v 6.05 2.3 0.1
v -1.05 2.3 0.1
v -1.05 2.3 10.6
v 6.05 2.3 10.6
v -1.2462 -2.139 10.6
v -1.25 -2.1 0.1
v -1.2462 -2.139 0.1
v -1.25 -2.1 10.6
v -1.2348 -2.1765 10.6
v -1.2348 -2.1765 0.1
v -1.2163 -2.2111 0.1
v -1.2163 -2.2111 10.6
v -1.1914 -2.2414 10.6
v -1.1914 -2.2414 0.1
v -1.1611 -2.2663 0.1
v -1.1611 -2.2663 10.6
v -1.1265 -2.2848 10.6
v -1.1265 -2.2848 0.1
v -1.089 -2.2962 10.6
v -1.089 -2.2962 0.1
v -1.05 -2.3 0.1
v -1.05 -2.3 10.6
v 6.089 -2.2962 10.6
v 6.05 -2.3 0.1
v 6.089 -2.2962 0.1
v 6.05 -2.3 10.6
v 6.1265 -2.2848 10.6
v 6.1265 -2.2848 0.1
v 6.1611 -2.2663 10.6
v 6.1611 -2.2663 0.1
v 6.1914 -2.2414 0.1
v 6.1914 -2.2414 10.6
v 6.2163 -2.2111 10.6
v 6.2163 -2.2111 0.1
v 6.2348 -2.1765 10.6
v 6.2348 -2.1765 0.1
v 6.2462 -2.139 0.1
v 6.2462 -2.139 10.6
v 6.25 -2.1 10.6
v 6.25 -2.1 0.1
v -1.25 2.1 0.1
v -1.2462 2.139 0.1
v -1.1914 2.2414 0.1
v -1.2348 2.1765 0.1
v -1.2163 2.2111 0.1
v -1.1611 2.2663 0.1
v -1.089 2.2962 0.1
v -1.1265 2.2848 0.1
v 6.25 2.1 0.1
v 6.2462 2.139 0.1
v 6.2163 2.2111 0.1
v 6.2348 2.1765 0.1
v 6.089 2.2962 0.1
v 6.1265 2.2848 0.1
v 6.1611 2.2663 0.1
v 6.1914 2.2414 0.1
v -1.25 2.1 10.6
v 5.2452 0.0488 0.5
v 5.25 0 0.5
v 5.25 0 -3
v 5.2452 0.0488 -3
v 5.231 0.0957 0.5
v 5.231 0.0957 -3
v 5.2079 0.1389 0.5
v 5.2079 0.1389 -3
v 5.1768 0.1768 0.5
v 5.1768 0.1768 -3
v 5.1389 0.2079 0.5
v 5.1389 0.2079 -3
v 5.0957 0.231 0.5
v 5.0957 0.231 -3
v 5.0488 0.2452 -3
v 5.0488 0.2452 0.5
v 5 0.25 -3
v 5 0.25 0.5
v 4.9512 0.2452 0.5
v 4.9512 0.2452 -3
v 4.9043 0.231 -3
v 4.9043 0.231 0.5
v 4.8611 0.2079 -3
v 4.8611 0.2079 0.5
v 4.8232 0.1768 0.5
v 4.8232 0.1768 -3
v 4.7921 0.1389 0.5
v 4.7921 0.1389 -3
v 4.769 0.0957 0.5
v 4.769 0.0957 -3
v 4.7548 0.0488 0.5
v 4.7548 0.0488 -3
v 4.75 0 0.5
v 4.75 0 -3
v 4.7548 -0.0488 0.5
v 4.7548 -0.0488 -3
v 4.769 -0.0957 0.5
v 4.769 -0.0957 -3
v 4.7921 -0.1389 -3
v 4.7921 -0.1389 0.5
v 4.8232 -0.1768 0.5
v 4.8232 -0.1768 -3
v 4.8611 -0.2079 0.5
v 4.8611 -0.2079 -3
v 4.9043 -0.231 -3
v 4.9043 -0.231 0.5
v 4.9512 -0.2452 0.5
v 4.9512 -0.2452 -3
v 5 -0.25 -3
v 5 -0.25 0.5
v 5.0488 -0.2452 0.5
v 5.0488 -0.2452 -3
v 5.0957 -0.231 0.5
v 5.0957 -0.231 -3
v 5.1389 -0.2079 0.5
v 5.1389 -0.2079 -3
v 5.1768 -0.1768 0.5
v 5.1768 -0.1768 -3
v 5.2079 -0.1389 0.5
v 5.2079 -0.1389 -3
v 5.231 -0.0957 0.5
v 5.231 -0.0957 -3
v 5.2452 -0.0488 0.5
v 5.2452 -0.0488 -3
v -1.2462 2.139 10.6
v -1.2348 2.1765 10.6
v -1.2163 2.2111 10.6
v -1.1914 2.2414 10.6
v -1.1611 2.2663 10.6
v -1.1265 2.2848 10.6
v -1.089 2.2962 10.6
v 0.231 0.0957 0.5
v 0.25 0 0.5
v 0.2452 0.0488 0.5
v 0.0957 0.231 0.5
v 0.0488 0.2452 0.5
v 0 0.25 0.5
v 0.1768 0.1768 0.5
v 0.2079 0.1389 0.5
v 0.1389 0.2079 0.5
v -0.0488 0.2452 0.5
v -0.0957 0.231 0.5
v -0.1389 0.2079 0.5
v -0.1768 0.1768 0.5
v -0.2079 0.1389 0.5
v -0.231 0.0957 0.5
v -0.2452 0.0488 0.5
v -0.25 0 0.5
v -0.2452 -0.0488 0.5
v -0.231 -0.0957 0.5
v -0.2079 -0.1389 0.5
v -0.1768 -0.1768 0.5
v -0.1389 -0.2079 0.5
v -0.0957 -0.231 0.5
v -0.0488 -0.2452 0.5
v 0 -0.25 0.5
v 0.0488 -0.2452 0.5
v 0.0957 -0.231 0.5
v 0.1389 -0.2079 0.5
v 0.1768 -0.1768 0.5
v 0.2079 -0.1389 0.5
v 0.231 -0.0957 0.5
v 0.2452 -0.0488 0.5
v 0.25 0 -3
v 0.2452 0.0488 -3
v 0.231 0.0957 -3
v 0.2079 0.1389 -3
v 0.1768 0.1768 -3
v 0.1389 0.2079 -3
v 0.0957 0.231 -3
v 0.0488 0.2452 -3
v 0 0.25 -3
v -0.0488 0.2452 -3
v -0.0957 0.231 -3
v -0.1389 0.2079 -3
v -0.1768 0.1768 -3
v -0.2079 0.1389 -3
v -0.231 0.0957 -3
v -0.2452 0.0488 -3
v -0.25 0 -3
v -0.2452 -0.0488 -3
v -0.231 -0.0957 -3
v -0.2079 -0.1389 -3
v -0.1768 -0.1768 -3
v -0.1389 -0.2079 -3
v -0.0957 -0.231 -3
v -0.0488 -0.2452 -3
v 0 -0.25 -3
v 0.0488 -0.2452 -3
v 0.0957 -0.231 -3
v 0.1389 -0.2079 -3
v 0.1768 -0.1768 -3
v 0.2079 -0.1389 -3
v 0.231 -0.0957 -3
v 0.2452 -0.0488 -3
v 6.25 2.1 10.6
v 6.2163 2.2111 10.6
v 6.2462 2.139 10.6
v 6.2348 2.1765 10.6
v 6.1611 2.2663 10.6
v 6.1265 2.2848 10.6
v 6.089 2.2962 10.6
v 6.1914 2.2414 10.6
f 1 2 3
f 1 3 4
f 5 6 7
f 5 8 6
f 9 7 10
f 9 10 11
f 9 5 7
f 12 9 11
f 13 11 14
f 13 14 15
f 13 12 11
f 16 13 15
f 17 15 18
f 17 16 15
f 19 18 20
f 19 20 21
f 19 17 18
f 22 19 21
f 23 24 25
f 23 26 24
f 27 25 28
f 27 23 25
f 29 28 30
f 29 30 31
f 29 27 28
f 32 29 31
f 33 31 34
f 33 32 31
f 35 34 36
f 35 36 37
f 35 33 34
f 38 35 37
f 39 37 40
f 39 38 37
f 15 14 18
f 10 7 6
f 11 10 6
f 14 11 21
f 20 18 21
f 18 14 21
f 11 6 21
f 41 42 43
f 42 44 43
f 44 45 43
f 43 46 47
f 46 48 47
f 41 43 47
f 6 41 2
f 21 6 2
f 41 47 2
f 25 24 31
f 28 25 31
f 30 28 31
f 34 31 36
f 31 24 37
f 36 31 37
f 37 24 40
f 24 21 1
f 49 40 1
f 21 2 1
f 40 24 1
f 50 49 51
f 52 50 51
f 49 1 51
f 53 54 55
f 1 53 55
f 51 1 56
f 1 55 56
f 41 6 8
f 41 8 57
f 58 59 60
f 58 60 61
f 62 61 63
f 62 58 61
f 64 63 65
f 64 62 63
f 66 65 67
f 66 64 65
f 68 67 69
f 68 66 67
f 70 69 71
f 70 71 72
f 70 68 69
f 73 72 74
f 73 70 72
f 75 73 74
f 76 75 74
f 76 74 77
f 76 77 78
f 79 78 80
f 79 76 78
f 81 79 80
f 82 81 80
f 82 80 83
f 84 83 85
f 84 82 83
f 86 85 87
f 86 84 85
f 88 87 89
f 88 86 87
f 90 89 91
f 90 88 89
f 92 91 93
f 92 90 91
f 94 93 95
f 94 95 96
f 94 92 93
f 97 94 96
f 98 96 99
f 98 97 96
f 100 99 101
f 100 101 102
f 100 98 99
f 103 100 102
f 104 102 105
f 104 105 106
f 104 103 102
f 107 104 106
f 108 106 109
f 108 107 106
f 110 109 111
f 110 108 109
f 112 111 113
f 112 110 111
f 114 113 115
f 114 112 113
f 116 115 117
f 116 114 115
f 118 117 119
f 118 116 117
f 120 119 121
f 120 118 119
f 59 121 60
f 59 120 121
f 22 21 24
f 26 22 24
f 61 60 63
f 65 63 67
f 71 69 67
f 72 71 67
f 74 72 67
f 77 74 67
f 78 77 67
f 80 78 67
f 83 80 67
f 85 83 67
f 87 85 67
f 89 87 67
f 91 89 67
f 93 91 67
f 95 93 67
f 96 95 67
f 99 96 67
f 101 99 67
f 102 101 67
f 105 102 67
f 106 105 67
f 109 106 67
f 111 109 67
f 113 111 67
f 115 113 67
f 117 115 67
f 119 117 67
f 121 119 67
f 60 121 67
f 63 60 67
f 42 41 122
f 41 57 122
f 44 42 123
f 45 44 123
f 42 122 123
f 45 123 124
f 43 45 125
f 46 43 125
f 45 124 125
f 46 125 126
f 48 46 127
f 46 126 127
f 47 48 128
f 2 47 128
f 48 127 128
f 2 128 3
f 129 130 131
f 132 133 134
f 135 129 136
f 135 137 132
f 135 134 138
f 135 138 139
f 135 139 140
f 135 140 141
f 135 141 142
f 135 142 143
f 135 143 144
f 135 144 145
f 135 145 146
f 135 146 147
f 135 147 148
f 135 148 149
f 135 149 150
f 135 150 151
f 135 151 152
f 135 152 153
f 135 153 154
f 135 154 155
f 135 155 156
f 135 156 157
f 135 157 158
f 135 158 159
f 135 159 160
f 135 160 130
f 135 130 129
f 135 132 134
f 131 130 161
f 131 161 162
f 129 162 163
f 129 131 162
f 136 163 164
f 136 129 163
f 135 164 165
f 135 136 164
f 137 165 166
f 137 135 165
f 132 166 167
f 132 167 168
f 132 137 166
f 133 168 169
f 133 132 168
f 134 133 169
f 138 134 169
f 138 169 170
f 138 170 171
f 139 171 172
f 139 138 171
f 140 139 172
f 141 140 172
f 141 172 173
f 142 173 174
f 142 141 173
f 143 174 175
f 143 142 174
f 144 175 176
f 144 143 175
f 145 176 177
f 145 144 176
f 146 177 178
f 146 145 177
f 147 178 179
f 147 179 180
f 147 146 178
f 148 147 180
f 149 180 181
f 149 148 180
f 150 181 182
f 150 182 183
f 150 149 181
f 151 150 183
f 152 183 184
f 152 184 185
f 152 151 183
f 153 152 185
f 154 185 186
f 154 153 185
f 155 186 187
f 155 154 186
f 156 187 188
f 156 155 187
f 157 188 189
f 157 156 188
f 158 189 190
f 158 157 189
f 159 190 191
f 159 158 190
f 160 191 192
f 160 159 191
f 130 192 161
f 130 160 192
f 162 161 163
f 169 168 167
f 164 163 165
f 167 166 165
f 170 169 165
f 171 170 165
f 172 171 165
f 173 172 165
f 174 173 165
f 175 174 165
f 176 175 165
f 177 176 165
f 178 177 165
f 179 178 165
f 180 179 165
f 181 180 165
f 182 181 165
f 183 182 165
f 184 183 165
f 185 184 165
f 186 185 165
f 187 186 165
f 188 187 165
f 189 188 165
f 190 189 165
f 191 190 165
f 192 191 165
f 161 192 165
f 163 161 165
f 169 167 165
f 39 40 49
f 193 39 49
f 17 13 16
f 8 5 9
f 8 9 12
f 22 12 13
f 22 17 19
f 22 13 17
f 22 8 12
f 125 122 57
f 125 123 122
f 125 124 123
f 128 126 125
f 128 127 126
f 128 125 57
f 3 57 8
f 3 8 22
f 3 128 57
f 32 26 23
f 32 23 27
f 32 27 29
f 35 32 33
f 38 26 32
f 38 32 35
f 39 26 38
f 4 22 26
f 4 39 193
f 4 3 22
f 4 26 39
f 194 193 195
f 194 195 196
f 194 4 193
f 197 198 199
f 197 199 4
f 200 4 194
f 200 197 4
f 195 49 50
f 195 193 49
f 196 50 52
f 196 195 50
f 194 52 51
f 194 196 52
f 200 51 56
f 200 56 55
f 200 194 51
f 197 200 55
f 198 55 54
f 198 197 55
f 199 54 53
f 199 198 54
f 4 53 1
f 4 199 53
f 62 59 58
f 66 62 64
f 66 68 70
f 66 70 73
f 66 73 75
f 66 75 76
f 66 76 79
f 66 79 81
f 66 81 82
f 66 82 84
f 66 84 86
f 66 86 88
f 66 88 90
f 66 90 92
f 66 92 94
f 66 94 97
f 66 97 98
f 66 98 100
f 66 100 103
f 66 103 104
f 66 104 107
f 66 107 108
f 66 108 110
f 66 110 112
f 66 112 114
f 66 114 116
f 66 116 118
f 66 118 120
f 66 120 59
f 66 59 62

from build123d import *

# Parameters (mm, degrees)
SKETCH001_R  = 0.25
PAD001_DEPTH = 3.5
SKETCH_W     = 7.5
SKETCH_H     = 4.6
PAD_DEPTH    = 10.5
FILLET_R     = 0.2


with BuildPart() as pad001:
    # Sketch001 → Pad001 (new body)
    with BuildSketch(Plane.XY.offset(0.5)):
        Circle(SKETCH001_R)
        with Locations((5, 0)):
            Circle(SKETCH001_R)
    extrude(amount=-PAD001_DEPTH)


with BuildPart() as fillet_body:
    # Sketch → Pad (new body)
    with BuildSketch(Plane.XY.offset(0.1)):
        with Locations((2.5, 0)):
            Rectangle(SKETCH_W, SKETCH_H)
    extrude(amount=PAD_DEPTH)

    # Fillet
    fillet_edges = [fillet_body.edges().sort_by_distance(p)[0] for p in [
        (6.25, -2.3, 5.35),
        (6.25, 2.3, 5.35),
        (-1.25, -2.3, 5.35),
        (-1.25, 2.3, 5.35),
    ]]
    fillet(fillet_edges, radius=FILLET_R)


solid = Compound([pad001.part, fillet_body.part])
